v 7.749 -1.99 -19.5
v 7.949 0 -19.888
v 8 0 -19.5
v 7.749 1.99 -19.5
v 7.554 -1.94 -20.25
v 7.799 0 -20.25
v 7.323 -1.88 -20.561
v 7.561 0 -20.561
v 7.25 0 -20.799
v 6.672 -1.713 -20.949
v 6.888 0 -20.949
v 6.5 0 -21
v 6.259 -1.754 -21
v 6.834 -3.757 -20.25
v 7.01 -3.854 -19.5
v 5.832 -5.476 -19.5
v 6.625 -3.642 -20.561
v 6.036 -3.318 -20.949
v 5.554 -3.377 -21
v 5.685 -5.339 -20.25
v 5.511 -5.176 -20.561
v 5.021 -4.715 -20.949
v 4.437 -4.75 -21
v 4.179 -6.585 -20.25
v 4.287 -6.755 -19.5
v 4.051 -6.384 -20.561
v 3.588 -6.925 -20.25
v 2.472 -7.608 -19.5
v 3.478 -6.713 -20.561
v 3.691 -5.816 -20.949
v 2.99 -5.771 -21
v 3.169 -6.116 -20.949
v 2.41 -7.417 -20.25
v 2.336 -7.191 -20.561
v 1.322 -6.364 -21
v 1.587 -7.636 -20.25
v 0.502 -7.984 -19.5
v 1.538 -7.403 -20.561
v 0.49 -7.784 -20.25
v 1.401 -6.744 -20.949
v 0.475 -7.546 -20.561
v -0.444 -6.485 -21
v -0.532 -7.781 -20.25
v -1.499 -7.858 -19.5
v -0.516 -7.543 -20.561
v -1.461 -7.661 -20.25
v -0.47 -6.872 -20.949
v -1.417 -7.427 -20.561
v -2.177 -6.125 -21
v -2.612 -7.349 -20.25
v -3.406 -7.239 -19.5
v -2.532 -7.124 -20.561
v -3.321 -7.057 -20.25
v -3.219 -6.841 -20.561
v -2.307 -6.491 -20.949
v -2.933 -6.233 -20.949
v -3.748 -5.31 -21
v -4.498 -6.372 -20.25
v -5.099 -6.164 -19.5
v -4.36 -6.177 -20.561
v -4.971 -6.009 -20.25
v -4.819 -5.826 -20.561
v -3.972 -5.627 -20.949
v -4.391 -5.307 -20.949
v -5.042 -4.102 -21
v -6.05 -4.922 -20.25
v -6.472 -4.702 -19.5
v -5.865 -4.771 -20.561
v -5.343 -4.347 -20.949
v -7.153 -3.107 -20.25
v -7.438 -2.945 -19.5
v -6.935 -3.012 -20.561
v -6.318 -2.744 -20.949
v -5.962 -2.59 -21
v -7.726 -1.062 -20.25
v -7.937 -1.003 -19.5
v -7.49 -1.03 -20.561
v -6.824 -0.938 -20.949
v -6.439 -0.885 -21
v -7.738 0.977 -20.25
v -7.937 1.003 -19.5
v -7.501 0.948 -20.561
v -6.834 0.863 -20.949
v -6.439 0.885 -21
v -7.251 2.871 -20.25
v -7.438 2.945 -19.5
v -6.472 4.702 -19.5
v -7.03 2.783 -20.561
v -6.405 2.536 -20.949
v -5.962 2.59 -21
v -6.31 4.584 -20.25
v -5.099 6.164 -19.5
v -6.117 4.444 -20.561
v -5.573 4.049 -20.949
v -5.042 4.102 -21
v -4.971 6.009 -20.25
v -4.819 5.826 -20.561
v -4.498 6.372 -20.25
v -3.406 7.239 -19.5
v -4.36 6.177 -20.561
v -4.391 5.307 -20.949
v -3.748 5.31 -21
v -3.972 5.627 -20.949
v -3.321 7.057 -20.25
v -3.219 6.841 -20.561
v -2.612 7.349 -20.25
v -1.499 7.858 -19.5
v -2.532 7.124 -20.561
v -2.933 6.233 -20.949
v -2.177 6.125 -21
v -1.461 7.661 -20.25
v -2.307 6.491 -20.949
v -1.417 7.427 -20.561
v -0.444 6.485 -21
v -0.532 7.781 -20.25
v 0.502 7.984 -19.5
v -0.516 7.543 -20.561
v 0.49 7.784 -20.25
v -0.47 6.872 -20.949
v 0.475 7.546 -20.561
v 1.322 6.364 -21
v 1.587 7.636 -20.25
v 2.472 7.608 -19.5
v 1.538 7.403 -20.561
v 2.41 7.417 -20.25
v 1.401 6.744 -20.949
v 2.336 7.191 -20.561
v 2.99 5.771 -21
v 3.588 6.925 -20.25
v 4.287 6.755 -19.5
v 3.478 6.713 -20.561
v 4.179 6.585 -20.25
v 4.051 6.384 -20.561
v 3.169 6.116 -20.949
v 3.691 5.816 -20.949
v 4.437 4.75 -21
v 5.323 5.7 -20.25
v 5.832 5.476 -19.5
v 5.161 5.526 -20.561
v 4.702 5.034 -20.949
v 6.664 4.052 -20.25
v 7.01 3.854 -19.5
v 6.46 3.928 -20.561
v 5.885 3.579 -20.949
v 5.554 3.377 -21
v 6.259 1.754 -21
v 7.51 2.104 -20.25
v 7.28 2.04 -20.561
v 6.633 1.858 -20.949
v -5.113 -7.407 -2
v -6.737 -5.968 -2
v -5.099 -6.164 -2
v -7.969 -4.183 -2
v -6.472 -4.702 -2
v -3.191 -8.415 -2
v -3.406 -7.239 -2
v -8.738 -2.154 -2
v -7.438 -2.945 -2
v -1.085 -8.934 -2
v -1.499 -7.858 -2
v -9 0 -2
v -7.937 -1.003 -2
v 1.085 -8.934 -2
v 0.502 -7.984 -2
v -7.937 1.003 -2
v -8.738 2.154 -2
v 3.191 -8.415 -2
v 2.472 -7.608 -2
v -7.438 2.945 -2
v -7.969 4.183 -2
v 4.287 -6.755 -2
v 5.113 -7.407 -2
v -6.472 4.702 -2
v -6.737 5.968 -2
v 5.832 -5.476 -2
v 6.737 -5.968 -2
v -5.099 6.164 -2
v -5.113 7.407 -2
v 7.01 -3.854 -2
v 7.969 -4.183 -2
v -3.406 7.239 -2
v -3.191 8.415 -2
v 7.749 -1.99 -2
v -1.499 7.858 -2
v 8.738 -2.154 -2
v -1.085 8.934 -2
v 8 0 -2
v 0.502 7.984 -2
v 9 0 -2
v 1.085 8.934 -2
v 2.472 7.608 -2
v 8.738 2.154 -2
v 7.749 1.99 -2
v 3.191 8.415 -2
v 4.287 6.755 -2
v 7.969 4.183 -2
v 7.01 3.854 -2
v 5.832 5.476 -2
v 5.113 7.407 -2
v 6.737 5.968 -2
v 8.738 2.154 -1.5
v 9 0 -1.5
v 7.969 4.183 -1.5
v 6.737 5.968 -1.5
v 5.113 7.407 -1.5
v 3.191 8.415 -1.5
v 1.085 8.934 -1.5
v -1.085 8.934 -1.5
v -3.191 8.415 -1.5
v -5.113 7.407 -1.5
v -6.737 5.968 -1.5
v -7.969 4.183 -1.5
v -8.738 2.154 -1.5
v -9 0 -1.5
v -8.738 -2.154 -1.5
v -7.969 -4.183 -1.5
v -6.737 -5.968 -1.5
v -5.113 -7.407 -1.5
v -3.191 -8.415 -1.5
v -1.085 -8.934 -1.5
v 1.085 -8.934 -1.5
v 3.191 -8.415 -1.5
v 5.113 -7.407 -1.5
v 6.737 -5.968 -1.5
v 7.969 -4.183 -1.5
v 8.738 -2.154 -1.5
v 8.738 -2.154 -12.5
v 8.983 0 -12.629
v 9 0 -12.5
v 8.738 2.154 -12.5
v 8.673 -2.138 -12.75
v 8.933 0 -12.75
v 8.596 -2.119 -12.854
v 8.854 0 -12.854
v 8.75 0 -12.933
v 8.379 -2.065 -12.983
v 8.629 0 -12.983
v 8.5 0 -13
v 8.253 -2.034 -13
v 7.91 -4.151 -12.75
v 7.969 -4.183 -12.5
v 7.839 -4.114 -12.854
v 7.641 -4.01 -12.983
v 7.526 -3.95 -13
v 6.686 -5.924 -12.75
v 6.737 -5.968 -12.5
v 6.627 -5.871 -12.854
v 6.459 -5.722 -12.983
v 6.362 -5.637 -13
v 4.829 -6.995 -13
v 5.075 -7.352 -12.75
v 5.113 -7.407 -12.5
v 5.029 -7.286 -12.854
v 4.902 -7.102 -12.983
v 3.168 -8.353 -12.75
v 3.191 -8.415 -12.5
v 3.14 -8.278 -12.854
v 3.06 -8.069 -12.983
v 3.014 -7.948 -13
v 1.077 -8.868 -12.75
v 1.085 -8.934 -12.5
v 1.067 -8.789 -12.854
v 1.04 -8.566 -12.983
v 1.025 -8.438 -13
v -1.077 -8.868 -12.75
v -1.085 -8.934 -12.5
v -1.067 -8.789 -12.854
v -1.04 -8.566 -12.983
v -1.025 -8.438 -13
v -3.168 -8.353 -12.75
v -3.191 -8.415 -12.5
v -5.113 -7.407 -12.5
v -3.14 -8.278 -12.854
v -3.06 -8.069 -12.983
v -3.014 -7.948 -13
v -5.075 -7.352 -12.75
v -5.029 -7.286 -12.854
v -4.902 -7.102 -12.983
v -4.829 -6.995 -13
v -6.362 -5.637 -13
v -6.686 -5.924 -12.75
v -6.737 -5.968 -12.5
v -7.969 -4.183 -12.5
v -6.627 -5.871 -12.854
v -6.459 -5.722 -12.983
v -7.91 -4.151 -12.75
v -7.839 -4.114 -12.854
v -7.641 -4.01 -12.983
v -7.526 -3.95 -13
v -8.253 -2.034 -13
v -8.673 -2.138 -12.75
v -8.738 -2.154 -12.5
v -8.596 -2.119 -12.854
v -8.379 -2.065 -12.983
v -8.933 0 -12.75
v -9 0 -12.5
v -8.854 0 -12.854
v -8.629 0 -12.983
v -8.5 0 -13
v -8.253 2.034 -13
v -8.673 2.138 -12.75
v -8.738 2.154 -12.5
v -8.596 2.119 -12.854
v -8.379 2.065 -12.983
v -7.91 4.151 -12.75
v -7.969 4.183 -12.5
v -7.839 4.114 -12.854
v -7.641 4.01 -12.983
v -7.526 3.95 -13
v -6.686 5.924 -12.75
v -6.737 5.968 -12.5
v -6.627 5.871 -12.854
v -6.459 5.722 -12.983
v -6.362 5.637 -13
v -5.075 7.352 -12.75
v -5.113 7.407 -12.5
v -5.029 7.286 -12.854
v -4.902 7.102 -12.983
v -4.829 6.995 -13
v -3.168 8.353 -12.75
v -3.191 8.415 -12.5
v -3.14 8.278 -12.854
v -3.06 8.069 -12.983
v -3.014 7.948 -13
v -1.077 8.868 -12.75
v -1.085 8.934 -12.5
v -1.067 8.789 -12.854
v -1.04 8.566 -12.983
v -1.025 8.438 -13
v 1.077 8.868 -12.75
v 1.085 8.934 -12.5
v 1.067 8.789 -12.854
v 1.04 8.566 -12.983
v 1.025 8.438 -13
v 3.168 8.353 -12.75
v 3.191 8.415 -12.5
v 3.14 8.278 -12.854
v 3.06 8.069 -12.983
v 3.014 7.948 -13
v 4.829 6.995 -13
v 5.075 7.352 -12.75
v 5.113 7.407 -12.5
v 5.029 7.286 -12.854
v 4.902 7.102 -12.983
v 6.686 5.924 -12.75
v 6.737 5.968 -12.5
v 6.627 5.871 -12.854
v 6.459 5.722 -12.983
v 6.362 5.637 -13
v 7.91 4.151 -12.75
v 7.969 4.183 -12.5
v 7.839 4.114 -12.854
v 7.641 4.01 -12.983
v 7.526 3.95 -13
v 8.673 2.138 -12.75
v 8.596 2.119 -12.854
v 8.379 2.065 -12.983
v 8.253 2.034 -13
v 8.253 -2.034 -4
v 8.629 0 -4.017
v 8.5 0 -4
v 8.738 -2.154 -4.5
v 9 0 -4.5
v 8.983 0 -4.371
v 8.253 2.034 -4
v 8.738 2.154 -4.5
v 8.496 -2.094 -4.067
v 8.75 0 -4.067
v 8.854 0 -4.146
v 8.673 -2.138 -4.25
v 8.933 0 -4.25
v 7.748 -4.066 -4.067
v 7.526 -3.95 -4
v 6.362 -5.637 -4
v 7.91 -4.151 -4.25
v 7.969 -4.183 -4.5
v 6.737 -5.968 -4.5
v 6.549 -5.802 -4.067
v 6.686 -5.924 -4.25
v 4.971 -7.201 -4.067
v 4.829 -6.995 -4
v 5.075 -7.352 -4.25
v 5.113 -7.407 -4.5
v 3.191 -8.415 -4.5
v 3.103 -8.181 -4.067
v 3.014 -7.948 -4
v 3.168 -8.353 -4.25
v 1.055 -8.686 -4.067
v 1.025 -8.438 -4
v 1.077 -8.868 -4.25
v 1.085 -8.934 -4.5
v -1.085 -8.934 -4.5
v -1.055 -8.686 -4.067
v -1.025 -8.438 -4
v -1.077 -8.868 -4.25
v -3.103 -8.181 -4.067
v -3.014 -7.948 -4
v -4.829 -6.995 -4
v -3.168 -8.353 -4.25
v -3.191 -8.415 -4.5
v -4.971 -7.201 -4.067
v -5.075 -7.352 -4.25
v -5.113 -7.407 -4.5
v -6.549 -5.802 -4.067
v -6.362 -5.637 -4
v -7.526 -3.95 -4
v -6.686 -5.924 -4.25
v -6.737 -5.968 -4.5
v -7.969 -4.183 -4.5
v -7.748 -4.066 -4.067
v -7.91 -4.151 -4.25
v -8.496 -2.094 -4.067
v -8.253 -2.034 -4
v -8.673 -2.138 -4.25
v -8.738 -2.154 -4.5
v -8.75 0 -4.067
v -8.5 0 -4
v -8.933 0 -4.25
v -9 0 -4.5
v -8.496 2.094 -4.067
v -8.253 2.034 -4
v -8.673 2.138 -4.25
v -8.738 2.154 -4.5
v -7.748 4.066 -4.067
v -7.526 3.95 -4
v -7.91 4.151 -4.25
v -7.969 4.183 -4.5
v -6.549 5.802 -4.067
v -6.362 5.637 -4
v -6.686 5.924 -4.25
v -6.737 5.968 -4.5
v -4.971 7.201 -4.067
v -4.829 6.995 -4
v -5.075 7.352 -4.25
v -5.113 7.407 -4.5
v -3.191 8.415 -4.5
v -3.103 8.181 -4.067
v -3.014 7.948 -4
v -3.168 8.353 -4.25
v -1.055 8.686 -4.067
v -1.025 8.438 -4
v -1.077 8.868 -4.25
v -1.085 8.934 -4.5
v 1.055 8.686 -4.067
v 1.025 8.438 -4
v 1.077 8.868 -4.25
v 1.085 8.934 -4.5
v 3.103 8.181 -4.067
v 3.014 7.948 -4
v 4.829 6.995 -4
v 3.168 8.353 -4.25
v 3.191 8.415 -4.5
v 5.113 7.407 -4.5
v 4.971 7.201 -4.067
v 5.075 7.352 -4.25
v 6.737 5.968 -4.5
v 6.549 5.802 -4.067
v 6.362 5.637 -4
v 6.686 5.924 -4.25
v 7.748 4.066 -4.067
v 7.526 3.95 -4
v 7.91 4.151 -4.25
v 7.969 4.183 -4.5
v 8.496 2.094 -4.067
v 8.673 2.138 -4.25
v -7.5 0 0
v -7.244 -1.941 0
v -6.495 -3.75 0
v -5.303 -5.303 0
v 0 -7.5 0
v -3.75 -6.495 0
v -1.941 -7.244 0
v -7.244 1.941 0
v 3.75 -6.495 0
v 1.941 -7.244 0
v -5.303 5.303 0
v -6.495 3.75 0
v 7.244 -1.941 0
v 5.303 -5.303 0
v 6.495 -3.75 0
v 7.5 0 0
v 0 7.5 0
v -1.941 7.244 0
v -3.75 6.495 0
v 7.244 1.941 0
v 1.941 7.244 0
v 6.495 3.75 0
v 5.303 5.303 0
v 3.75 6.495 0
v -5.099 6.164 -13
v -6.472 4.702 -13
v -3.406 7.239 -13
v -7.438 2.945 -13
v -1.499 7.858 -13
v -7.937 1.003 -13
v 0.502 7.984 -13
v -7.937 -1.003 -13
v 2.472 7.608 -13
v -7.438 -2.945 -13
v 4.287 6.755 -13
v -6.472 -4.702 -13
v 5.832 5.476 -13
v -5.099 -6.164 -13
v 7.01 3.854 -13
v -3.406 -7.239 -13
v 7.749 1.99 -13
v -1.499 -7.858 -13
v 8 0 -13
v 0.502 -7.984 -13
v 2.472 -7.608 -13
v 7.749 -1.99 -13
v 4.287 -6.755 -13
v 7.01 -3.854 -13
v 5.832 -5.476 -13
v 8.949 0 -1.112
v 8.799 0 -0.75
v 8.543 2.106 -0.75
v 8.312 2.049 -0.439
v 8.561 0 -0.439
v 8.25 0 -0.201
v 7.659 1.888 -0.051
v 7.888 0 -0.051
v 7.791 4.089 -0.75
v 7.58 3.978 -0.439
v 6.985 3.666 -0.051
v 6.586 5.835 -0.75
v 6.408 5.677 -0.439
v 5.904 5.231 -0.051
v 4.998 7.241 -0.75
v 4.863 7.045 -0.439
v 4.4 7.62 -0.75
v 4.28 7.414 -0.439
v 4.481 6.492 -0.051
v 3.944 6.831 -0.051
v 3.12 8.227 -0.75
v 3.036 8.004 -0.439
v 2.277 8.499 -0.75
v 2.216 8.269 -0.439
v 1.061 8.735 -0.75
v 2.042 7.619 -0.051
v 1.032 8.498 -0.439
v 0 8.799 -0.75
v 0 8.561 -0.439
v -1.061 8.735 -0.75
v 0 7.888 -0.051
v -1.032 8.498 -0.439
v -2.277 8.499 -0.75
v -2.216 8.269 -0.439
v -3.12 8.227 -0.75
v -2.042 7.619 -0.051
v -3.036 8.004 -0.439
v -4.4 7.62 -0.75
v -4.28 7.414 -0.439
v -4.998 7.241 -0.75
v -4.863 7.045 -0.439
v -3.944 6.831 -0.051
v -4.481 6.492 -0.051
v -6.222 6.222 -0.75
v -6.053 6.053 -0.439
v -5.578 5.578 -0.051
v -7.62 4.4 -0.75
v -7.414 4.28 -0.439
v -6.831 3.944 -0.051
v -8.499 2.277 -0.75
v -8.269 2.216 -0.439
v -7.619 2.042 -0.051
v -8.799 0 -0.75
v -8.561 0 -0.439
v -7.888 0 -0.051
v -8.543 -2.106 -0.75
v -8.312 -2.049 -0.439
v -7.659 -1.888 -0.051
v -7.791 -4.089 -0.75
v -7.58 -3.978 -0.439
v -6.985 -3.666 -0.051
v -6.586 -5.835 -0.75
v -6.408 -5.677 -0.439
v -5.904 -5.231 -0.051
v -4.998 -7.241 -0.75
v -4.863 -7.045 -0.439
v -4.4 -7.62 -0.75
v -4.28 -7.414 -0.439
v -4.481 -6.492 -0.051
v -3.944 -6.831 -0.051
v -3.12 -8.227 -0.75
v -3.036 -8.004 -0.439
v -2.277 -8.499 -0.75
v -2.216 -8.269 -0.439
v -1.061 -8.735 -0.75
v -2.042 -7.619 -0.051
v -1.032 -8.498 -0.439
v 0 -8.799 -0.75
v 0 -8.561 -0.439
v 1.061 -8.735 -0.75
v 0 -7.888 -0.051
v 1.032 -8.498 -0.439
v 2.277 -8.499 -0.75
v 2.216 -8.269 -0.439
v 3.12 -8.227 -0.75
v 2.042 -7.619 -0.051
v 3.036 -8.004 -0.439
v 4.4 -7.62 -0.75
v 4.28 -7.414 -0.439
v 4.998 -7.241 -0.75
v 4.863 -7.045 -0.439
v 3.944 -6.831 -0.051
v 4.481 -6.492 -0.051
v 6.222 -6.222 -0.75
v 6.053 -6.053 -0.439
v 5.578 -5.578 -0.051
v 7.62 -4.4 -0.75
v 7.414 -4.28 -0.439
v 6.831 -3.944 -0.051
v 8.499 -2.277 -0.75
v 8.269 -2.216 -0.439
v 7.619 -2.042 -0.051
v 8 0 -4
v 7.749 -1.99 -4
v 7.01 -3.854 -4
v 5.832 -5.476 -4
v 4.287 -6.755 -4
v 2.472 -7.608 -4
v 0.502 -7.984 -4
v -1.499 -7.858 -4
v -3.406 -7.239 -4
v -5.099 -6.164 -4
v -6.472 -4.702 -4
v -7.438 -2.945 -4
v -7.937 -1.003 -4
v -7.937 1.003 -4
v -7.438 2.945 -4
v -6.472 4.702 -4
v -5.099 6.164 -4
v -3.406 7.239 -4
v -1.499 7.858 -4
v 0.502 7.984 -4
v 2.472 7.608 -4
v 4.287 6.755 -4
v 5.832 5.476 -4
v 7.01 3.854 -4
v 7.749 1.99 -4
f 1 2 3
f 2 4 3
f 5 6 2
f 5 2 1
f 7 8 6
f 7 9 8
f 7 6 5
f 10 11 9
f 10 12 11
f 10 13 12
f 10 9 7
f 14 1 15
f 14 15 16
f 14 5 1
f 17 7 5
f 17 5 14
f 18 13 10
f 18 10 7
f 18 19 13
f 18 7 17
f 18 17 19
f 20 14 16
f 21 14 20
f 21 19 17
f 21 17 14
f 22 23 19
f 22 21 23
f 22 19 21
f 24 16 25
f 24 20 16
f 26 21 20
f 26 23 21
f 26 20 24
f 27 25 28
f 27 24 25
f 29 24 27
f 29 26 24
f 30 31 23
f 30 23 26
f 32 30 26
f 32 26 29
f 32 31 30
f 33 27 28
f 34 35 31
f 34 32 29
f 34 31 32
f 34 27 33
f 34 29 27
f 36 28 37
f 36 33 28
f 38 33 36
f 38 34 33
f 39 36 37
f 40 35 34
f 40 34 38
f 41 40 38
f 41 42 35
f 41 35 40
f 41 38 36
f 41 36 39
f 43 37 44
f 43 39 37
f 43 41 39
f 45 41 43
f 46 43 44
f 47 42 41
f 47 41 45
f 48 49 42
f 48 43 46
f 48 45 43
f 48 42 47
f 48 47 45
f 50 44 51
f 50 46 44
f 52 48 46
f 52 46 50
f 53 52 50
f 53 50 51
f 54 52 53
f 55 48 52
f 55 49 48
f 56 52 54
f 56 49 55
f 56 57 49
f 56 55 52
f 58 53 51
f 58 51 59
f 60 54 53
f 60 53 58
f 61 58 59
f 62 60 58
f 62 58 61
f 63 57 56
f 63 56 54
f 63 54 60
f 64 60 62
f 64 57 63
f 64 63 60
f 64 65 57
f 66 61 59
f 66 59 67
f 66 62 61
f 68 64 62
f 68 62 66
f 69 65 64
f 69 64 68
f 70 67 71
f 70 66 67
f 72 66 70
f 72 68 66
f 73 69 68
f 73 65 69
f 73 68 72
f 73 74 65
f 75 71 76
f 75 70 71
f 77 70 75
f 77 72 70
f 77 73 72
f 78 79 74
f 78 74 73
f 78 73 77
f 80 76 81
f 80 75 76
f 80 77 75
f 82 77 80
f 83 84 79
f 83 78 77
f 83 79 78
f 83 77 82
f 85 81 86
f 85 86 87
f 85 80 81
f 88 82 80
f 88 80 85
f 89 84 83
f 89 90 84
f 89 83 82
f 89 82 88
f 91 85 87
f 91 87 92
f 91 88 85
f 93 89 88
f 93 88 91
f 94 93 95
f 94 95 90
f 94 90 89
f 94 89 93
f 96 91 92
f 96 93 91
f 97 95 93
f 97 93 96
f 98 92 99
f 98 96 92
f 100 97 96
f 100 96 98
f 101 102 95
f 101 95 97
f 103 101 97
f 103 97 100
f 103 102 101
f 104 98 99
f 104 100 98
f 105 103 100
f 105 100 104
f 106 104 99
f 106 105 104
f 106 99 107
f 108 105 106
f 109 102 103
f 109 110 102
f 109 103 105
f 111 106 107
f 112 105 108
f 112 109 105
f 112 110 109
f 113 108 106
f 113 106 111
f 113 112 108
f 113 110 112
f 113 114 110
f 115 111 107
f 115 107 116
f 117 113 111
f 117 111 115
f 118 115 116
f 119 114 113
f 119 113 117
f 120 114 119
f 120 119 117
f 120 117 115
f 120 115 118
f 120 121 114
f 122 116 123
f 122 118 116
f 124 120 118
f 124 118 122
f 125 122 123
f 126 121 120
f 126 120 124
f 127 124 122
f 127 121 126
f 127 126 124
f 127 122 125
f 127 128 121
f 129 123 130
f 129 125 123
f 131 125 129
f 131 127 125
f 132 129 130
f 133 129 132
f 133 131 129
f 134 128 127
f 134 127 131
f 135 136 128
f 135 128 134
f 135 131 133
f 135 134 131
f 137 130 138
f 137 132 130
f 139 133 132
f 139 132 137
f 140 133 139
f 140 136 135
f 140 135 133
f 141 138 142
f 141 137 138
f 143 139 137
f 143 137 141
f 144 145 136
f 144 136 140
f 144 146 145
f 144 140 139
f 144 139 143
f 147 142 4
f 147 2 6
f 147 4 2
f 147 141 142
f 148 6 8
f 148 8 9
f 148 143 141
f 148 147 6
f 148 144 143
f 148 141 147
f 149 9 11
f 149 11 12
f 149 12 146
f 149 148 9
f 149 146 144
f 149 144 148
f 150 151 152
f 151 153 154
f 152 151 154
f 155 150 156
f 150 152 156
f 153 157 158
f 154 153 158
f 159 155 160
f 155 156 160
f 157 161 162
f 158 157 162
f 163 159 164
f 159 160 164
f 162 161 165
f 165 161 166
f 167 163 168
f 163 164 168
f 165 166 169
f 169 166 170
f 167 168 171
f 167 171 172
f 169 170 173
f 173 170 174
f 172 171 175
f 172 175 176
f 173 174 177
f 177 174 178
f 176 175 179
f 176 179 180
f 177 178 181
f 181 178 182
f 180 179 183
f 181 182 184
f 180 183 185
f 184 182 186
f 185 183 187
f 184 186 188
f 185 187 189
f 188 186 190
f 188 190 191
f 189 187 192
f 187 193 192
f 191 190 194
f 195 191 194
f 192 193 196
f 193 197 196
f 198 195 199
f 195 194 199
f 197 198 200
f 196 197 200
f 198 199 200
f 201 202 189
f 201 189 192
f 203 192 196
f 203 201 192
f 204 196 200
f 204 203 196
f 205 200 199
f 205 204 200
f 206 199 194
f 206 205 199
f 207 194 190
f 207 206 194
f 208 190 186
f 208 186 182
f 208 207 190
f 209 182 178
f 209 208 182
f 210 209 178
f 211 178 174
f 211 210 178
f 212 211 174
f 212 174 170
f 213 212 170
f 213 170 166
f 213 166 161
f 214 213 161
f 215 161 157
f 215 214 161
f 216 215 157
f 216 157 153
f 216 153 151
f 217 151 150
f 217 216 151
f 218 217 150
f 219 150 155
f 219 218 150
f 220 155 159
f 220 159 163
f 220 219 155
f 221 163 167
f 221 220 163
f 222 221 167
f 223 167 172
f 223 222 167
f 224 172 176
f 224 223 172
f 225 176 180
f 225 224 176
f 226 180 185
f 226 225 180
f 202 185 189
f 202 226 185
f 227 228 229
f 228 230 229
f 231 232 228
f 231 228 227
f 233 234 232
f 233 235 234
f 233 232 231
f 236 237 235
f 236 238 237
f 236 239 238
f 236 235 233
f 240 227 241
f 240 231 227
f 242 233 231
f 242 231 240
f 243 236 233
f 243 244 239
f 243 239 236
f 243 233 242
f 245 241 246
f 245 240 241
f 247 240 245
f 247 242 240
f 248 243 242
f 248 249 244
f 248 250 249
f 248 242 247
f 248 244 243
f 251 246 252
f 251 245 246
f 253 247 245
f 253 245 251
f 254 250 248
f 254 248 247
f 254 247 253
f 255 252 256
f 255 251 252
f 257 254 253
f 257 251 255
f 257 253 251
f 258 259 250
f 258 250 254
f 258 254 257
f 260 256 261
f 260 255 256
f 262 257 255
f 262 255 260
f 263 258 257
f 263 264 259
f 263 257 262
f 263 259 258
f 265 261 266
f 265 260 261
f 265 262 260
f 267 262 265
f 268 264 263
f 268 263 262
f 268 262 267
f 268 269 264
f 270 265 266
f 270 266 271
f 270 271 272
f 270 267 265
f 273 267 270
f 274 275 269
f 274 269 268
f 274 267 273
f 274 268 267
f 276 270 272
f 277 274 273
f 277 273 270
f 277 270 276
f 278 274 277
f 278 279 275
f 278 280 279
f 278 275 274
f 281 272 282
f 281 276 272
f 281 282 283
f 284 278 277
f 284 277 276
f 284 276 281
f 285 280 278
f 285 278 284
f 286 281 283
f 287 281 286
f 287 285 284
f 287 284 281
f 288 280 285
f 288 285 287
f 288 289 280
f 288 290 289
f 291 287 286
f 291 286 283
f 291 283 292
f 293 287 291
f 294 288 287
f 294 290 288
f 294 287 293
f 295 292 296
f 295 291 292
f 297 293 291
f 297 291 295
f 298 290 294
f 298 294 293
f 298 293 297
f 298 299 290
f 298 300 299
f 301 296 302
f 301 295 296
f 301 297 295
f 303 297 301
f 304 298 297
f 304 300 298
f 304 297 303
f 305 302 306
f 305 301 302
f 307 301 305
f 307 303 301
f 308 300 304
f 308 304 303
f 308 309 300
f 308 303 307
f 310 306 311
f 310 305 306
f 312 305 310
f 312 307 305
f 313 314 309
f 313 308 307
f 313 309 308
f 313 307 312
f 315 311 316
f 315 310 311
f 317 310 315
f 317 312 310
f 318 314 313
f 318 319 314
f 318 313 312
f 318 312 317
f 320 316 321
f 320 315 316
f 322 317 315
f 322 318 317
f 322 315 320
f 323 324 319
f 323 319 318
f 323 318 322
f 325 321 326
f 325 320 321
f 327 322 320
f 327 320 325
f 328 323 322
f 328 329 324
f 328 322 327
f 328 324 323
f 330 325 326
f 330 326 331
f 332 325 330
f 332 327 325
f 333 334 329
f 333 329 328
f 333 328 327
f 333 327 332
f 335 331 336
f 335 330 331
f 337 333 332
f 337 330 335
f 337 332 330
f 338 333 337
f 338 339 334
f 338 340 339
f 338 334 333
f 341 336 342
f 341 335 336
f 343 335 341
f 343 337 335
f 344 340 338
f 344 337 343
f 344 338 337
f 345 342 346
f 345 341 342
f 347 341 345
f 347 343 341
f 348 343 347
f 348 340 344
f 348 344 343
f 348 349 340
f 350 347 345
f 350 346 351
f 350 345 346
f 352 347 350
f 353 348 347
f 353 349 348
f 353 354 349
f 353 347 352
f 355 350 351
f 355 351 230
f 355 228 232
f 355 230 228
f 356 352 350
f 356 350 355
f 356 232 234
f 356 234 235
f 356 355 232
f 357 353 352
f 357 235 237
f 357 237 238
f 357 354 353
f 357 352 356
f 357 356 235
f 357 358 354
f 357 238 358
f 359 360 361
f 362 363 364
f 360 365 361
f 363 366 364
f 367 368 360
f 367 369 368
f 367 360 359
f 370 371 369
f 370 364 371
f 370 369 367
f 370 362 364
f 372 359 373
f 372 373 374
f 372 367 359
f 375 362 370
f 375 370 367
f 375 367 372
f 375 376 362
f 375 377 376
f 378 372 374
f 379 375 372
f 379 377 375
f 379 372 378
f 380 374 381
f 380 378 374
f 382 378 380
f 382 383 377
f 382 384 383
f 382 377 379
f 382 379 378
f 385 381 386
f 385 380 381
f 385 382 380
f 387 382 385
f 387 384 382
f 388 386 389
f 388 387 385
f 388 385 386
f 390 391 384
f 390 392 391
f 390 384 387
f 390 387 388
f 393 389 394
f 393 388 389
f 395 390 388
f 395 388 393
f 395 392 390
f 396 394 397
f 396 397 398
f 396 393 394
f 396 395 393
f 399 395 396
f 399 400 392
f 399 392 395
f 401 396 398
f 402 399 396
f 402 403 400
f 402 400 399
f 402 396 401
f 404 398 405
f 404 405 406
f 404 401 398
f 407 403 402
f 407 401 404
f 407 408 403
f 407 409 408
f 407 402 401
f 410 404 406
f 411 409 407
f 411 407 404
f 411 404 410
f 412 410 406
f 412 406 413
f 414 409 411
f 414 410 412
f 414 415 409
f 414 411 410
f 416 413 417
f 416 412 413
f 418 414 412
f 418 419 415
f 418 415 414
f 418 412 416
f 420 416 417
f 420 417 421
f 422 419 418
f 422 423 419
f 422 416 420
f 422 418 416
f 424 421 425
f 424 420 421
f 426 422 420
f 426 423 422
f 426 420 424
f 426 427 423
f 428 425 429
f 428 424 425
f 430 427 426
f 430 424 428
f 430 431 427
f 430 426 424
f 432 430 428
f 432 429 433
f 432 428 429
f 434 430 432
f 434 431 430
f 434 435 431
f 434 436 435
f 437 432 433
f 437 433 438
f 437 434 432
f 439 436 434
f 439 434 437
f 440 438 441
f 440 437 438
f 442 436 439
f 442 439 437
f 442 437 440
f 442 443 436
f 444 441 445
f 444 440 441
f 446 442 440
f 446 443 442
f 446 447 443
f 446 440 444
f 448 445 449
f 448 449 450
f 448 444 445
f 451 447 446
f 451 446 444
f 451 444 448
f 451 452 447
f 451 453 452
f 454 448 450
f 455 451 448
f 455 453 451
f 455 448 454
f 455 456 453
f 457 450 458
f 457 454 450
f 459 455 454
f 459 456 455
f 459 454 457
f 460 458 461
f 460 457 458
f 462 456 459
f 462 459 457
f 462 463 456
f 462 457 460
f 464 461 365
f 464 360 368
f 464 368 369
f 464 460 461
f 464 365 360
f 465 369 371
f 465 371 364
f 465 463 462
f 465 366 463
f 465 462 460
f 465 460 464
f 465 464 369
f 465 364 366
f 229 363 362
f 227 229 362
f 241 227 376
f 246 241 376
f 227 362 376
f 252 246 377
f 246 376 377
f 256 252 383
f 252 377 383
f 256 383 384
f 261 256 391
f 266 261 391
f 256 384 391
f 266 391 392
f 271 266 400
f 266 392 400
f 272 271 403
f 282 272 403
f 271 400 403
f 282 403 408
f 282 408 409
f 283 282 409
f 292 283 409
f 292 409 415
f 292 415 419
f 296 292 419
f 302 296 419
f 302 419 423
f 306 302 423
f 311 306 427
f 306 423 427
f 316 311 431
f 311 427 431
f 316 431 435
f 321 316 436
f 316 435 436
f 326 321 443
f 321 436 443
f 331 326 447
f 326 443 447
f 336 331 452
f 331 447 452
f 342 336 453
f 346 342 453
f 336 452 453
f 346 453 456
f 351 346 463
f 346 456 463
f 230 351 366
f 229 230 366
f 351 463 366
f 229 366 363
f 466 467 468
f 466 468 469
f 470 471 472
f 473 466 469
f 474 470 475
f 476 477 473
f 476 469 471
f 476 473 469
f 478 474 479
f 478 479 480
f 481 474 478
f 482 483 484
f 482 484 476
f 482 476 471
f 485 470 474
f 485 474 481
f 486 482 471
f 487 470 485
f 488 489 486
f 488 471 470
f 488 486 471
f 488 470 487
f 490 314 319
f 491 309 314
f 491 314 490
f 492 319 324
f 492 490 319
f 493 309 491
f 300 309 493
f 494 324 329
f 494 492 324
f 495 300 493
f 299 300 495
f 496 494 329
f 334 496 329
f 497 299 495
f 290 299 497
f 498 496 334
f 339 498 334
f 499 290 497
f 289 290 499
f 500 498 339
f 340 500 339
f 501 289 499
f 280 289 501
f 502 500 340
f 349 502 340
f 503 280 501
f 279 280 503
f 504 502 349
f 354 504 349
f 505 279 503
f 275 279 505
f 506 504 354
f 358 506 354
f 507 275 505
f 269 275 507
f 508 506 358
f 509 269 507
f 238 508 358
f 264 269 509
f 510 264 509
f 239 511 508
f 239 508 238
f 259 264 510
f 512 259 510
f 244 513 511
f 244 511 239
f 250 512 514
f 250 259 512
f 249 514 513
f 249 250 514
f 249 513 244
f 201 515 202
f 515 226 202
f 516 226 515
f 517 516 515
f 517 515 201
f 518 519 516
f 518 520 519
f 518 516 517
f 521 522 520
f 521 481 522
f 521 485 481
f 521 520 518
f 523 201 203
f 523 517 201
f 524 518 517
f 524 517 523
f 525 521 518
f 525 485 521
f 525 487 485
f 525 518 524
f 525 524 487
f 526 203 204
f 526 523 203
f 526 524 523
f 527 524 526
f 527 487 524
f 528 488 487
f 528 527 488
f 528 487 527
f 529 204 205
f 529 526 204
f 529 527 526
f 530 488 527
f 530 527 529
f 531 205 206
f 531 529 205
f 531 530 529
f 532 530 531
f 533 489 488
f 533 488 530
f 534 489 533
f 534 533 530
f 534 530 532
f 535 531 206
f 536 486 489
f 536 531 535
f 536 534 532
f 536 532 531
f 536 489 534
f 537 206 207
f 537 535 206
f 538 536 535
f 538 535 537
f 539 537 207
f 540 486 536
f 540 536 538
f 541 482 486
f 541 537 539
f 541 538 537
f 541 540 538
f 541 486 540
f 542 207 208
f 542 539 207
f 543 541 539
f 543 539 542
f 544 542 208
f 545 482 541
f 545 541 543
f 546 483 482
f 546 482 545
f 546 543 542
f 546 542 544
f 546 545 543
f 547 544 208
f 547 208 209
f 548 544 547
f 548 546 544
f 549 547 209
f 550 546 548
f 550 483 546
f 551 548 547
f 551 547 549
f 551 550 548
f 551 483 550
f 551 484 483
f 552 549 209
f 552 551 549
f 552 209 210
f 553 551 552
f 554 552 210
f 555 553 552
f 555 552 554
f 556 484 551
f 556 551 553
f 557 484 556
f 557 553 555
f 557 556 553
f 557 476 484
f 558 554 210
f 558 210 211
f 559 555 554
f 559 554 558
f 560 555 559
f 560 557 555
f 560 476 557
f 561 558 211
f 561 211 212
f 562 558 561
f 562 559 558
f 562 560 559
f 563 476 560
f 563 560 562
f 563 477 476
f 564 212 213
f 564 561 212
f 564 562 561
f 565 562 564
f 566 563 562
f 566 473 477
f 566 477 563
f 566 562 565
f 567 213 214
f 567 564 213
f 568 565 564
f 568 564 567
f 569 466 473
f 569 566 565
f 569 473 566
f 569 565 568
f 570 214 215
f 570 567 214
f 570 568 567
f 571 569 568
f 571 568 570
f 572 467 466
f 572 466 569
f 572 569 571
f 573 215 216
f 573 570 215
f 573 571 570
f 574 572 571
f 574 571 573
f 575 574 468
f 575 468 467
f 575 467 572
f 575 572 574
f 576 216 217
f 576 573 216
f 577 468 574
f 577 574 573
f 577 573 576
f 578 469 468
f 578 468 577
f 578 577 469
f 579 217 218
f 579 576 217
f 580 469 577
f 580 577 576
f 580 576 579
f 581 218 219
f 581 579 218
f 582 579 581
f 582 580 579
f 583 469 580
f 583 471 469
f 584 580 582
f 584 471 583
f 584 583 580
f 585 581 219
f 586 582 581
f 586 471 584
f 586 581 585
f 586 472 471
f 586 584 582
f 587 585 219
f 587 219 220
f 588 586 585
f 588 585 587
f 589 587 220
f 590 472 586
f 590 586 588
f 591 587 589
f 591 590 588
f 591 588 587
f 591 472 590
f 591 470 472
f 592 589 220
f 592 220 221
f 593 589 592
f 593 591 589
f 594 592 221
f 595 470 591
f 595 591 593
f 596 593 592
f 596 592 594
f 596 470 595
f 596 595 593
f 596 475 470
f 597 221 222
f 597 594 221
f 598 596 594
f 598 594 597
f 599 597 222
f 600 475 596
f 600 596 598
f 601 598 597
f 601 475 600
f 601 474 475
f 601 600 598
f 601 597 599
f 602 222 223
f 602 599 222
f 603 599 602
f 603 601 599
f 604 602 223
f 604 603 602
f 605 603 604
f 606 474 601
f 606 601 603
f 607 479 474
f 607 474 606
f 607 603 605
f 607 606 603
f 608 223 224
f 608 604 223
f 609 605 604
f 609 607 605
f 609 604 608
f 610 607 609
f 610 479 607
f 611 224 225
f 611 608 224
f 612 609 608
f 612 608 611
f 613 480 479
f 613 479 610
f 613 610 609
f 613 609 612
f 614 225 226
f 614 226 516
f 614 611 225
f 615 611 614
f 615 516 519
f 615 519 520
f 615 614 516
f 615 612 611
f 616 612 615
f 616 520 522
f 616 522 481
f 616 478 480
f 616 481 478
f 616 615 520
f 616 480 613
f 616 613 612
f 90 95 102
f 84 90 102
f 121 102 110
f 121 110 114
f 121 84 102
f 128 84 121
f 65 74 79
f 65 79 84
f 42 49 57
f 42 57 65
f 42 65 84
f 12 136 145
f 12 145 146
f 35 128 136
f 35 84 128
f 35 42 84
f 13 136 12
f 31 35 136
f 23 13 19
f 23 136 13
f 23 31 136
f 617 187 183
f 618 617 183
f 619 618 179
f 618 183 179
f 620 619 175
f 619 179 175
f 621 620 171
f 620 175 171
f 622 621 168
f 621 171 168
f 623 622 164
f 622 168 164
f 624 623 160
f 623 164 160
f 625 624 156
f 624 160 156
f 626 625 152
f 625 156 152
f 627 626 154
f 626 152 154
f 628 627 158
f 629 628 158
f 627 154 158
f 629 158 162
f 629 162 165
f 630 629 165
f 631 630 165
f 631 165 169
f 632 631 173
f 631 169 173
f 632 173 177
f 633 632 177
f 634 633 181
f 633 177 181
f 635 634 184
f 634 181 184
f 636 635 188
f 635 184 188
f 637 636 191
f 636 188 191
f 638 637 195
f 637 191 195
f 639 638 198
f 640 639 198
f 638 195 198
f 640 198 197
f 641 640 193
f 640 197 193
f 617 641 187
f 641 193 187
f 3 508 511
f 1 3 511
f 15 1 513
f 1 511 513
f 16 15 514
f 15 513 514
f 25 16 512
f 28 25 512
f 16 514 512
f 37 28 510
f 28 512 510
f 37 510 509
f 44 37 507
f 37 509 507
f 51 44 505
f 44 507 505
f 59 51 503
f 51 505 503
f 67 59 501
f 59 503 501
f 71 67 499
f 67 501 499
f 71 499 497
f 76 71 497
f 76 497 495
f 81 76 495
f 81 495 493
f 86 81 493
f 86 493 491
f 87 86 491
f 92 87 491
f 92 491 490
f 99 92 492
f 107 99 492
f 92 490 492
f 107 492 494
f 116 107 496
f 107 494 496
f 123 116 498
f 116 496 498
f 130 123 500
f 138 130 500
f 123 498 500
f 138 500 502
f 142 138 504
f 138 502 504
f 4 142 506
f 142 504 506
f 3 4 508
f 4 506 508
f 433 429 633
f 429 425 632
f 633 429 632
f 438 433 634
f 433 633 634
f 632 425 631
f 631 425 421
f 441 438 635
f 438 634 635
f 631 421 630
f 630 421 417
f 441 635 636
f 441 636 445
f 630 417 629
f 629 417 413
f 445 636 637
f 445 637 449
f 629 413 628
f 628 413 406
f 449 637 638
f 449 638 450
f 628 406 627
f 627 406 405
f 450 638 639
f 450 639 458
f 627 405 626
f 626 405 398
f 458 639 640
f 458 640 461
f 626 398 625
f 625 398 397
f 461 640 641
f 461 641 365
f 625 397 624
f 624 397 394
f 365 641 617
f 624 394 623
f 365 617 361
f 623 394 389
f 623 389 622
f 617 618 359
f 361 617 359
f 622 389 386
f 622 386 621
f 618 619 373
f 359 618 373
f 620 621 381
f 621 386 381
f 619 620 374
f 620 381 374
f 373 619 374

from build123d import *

# Parameters (mm, degrees)
SKETCH_R     = 9
PAD_DEPTH    = 2
SKETCH001_R  = 8
PAD001_DEPTH = 2
SKETCH002_R  = 9
PAD002_DEPTH = 9
SKETCH003_R  = 8
PAD003_DEPTH = 8
FILLET_R     = 1.5
FILLET001_R  = 0.5
FILLET002_R  = 1.5


with BuildPart() as part:
    # Sketch → Pad (new body)
    with BuildSketch(Plane.XY):
        Circle(SKETCH_R)
    extrude(amount=-PAD_DEPTH)

    # Sketch001 (on Face3 of Pad) → Pad001 (join)
    with BuildSketch(Plane(origin=(0, 0, -2), x_dir=(1, 0, 0), z_dir=(0, 0, -1))):
        Circle(SKETCH001_R)
    extrude(amount=PAD001_DEPTH)

    # Sketch002 (on Face5 of Pad001) → Pad002 (join)
    with BuildSketch(Plane(origin=(0, 0, -4), x_dir=(1, 0, 0), z_dir=(0, 0, -1))):
        Circle(SKETCH002_R)
    extrude(amount=PAD002_DEPTH)

    # Sketch003 (on Face7 of Pad002) → Pad003 (join)
    with BuildSketch(Plane(origin=(0, 0, -13), x_dir=(1, 0, 0), z_dir=(0, 0, -1))):
        Circle(SKETCH003_R)
    extrude(amount=PAD003_DEPTH)

    # Fillet
    fillet_edges = [part.edges().sort_by_distance(p)[0] for p in [
        (-9, 0, 0),
    ]]
    fillet(fillet_edges, radius=FILLET_R)

    # Fillet001
    fillet001_edges = [part.edges().sort_by_distance(p)[0] for p in [
        (-9, 0, -4),
        (-9, 0, -13),
    ]]
    fillet(fillet001_edges, radius=FILLET001_R)

    # Fillet002
    fillet002_edges = [part.edges().sort_by_distance(p)[0] for p in [
        (-8, 0, -21),
    ]]
    fillet(fillet002_edges, radius=FILLET002_R)


solid = part.part
